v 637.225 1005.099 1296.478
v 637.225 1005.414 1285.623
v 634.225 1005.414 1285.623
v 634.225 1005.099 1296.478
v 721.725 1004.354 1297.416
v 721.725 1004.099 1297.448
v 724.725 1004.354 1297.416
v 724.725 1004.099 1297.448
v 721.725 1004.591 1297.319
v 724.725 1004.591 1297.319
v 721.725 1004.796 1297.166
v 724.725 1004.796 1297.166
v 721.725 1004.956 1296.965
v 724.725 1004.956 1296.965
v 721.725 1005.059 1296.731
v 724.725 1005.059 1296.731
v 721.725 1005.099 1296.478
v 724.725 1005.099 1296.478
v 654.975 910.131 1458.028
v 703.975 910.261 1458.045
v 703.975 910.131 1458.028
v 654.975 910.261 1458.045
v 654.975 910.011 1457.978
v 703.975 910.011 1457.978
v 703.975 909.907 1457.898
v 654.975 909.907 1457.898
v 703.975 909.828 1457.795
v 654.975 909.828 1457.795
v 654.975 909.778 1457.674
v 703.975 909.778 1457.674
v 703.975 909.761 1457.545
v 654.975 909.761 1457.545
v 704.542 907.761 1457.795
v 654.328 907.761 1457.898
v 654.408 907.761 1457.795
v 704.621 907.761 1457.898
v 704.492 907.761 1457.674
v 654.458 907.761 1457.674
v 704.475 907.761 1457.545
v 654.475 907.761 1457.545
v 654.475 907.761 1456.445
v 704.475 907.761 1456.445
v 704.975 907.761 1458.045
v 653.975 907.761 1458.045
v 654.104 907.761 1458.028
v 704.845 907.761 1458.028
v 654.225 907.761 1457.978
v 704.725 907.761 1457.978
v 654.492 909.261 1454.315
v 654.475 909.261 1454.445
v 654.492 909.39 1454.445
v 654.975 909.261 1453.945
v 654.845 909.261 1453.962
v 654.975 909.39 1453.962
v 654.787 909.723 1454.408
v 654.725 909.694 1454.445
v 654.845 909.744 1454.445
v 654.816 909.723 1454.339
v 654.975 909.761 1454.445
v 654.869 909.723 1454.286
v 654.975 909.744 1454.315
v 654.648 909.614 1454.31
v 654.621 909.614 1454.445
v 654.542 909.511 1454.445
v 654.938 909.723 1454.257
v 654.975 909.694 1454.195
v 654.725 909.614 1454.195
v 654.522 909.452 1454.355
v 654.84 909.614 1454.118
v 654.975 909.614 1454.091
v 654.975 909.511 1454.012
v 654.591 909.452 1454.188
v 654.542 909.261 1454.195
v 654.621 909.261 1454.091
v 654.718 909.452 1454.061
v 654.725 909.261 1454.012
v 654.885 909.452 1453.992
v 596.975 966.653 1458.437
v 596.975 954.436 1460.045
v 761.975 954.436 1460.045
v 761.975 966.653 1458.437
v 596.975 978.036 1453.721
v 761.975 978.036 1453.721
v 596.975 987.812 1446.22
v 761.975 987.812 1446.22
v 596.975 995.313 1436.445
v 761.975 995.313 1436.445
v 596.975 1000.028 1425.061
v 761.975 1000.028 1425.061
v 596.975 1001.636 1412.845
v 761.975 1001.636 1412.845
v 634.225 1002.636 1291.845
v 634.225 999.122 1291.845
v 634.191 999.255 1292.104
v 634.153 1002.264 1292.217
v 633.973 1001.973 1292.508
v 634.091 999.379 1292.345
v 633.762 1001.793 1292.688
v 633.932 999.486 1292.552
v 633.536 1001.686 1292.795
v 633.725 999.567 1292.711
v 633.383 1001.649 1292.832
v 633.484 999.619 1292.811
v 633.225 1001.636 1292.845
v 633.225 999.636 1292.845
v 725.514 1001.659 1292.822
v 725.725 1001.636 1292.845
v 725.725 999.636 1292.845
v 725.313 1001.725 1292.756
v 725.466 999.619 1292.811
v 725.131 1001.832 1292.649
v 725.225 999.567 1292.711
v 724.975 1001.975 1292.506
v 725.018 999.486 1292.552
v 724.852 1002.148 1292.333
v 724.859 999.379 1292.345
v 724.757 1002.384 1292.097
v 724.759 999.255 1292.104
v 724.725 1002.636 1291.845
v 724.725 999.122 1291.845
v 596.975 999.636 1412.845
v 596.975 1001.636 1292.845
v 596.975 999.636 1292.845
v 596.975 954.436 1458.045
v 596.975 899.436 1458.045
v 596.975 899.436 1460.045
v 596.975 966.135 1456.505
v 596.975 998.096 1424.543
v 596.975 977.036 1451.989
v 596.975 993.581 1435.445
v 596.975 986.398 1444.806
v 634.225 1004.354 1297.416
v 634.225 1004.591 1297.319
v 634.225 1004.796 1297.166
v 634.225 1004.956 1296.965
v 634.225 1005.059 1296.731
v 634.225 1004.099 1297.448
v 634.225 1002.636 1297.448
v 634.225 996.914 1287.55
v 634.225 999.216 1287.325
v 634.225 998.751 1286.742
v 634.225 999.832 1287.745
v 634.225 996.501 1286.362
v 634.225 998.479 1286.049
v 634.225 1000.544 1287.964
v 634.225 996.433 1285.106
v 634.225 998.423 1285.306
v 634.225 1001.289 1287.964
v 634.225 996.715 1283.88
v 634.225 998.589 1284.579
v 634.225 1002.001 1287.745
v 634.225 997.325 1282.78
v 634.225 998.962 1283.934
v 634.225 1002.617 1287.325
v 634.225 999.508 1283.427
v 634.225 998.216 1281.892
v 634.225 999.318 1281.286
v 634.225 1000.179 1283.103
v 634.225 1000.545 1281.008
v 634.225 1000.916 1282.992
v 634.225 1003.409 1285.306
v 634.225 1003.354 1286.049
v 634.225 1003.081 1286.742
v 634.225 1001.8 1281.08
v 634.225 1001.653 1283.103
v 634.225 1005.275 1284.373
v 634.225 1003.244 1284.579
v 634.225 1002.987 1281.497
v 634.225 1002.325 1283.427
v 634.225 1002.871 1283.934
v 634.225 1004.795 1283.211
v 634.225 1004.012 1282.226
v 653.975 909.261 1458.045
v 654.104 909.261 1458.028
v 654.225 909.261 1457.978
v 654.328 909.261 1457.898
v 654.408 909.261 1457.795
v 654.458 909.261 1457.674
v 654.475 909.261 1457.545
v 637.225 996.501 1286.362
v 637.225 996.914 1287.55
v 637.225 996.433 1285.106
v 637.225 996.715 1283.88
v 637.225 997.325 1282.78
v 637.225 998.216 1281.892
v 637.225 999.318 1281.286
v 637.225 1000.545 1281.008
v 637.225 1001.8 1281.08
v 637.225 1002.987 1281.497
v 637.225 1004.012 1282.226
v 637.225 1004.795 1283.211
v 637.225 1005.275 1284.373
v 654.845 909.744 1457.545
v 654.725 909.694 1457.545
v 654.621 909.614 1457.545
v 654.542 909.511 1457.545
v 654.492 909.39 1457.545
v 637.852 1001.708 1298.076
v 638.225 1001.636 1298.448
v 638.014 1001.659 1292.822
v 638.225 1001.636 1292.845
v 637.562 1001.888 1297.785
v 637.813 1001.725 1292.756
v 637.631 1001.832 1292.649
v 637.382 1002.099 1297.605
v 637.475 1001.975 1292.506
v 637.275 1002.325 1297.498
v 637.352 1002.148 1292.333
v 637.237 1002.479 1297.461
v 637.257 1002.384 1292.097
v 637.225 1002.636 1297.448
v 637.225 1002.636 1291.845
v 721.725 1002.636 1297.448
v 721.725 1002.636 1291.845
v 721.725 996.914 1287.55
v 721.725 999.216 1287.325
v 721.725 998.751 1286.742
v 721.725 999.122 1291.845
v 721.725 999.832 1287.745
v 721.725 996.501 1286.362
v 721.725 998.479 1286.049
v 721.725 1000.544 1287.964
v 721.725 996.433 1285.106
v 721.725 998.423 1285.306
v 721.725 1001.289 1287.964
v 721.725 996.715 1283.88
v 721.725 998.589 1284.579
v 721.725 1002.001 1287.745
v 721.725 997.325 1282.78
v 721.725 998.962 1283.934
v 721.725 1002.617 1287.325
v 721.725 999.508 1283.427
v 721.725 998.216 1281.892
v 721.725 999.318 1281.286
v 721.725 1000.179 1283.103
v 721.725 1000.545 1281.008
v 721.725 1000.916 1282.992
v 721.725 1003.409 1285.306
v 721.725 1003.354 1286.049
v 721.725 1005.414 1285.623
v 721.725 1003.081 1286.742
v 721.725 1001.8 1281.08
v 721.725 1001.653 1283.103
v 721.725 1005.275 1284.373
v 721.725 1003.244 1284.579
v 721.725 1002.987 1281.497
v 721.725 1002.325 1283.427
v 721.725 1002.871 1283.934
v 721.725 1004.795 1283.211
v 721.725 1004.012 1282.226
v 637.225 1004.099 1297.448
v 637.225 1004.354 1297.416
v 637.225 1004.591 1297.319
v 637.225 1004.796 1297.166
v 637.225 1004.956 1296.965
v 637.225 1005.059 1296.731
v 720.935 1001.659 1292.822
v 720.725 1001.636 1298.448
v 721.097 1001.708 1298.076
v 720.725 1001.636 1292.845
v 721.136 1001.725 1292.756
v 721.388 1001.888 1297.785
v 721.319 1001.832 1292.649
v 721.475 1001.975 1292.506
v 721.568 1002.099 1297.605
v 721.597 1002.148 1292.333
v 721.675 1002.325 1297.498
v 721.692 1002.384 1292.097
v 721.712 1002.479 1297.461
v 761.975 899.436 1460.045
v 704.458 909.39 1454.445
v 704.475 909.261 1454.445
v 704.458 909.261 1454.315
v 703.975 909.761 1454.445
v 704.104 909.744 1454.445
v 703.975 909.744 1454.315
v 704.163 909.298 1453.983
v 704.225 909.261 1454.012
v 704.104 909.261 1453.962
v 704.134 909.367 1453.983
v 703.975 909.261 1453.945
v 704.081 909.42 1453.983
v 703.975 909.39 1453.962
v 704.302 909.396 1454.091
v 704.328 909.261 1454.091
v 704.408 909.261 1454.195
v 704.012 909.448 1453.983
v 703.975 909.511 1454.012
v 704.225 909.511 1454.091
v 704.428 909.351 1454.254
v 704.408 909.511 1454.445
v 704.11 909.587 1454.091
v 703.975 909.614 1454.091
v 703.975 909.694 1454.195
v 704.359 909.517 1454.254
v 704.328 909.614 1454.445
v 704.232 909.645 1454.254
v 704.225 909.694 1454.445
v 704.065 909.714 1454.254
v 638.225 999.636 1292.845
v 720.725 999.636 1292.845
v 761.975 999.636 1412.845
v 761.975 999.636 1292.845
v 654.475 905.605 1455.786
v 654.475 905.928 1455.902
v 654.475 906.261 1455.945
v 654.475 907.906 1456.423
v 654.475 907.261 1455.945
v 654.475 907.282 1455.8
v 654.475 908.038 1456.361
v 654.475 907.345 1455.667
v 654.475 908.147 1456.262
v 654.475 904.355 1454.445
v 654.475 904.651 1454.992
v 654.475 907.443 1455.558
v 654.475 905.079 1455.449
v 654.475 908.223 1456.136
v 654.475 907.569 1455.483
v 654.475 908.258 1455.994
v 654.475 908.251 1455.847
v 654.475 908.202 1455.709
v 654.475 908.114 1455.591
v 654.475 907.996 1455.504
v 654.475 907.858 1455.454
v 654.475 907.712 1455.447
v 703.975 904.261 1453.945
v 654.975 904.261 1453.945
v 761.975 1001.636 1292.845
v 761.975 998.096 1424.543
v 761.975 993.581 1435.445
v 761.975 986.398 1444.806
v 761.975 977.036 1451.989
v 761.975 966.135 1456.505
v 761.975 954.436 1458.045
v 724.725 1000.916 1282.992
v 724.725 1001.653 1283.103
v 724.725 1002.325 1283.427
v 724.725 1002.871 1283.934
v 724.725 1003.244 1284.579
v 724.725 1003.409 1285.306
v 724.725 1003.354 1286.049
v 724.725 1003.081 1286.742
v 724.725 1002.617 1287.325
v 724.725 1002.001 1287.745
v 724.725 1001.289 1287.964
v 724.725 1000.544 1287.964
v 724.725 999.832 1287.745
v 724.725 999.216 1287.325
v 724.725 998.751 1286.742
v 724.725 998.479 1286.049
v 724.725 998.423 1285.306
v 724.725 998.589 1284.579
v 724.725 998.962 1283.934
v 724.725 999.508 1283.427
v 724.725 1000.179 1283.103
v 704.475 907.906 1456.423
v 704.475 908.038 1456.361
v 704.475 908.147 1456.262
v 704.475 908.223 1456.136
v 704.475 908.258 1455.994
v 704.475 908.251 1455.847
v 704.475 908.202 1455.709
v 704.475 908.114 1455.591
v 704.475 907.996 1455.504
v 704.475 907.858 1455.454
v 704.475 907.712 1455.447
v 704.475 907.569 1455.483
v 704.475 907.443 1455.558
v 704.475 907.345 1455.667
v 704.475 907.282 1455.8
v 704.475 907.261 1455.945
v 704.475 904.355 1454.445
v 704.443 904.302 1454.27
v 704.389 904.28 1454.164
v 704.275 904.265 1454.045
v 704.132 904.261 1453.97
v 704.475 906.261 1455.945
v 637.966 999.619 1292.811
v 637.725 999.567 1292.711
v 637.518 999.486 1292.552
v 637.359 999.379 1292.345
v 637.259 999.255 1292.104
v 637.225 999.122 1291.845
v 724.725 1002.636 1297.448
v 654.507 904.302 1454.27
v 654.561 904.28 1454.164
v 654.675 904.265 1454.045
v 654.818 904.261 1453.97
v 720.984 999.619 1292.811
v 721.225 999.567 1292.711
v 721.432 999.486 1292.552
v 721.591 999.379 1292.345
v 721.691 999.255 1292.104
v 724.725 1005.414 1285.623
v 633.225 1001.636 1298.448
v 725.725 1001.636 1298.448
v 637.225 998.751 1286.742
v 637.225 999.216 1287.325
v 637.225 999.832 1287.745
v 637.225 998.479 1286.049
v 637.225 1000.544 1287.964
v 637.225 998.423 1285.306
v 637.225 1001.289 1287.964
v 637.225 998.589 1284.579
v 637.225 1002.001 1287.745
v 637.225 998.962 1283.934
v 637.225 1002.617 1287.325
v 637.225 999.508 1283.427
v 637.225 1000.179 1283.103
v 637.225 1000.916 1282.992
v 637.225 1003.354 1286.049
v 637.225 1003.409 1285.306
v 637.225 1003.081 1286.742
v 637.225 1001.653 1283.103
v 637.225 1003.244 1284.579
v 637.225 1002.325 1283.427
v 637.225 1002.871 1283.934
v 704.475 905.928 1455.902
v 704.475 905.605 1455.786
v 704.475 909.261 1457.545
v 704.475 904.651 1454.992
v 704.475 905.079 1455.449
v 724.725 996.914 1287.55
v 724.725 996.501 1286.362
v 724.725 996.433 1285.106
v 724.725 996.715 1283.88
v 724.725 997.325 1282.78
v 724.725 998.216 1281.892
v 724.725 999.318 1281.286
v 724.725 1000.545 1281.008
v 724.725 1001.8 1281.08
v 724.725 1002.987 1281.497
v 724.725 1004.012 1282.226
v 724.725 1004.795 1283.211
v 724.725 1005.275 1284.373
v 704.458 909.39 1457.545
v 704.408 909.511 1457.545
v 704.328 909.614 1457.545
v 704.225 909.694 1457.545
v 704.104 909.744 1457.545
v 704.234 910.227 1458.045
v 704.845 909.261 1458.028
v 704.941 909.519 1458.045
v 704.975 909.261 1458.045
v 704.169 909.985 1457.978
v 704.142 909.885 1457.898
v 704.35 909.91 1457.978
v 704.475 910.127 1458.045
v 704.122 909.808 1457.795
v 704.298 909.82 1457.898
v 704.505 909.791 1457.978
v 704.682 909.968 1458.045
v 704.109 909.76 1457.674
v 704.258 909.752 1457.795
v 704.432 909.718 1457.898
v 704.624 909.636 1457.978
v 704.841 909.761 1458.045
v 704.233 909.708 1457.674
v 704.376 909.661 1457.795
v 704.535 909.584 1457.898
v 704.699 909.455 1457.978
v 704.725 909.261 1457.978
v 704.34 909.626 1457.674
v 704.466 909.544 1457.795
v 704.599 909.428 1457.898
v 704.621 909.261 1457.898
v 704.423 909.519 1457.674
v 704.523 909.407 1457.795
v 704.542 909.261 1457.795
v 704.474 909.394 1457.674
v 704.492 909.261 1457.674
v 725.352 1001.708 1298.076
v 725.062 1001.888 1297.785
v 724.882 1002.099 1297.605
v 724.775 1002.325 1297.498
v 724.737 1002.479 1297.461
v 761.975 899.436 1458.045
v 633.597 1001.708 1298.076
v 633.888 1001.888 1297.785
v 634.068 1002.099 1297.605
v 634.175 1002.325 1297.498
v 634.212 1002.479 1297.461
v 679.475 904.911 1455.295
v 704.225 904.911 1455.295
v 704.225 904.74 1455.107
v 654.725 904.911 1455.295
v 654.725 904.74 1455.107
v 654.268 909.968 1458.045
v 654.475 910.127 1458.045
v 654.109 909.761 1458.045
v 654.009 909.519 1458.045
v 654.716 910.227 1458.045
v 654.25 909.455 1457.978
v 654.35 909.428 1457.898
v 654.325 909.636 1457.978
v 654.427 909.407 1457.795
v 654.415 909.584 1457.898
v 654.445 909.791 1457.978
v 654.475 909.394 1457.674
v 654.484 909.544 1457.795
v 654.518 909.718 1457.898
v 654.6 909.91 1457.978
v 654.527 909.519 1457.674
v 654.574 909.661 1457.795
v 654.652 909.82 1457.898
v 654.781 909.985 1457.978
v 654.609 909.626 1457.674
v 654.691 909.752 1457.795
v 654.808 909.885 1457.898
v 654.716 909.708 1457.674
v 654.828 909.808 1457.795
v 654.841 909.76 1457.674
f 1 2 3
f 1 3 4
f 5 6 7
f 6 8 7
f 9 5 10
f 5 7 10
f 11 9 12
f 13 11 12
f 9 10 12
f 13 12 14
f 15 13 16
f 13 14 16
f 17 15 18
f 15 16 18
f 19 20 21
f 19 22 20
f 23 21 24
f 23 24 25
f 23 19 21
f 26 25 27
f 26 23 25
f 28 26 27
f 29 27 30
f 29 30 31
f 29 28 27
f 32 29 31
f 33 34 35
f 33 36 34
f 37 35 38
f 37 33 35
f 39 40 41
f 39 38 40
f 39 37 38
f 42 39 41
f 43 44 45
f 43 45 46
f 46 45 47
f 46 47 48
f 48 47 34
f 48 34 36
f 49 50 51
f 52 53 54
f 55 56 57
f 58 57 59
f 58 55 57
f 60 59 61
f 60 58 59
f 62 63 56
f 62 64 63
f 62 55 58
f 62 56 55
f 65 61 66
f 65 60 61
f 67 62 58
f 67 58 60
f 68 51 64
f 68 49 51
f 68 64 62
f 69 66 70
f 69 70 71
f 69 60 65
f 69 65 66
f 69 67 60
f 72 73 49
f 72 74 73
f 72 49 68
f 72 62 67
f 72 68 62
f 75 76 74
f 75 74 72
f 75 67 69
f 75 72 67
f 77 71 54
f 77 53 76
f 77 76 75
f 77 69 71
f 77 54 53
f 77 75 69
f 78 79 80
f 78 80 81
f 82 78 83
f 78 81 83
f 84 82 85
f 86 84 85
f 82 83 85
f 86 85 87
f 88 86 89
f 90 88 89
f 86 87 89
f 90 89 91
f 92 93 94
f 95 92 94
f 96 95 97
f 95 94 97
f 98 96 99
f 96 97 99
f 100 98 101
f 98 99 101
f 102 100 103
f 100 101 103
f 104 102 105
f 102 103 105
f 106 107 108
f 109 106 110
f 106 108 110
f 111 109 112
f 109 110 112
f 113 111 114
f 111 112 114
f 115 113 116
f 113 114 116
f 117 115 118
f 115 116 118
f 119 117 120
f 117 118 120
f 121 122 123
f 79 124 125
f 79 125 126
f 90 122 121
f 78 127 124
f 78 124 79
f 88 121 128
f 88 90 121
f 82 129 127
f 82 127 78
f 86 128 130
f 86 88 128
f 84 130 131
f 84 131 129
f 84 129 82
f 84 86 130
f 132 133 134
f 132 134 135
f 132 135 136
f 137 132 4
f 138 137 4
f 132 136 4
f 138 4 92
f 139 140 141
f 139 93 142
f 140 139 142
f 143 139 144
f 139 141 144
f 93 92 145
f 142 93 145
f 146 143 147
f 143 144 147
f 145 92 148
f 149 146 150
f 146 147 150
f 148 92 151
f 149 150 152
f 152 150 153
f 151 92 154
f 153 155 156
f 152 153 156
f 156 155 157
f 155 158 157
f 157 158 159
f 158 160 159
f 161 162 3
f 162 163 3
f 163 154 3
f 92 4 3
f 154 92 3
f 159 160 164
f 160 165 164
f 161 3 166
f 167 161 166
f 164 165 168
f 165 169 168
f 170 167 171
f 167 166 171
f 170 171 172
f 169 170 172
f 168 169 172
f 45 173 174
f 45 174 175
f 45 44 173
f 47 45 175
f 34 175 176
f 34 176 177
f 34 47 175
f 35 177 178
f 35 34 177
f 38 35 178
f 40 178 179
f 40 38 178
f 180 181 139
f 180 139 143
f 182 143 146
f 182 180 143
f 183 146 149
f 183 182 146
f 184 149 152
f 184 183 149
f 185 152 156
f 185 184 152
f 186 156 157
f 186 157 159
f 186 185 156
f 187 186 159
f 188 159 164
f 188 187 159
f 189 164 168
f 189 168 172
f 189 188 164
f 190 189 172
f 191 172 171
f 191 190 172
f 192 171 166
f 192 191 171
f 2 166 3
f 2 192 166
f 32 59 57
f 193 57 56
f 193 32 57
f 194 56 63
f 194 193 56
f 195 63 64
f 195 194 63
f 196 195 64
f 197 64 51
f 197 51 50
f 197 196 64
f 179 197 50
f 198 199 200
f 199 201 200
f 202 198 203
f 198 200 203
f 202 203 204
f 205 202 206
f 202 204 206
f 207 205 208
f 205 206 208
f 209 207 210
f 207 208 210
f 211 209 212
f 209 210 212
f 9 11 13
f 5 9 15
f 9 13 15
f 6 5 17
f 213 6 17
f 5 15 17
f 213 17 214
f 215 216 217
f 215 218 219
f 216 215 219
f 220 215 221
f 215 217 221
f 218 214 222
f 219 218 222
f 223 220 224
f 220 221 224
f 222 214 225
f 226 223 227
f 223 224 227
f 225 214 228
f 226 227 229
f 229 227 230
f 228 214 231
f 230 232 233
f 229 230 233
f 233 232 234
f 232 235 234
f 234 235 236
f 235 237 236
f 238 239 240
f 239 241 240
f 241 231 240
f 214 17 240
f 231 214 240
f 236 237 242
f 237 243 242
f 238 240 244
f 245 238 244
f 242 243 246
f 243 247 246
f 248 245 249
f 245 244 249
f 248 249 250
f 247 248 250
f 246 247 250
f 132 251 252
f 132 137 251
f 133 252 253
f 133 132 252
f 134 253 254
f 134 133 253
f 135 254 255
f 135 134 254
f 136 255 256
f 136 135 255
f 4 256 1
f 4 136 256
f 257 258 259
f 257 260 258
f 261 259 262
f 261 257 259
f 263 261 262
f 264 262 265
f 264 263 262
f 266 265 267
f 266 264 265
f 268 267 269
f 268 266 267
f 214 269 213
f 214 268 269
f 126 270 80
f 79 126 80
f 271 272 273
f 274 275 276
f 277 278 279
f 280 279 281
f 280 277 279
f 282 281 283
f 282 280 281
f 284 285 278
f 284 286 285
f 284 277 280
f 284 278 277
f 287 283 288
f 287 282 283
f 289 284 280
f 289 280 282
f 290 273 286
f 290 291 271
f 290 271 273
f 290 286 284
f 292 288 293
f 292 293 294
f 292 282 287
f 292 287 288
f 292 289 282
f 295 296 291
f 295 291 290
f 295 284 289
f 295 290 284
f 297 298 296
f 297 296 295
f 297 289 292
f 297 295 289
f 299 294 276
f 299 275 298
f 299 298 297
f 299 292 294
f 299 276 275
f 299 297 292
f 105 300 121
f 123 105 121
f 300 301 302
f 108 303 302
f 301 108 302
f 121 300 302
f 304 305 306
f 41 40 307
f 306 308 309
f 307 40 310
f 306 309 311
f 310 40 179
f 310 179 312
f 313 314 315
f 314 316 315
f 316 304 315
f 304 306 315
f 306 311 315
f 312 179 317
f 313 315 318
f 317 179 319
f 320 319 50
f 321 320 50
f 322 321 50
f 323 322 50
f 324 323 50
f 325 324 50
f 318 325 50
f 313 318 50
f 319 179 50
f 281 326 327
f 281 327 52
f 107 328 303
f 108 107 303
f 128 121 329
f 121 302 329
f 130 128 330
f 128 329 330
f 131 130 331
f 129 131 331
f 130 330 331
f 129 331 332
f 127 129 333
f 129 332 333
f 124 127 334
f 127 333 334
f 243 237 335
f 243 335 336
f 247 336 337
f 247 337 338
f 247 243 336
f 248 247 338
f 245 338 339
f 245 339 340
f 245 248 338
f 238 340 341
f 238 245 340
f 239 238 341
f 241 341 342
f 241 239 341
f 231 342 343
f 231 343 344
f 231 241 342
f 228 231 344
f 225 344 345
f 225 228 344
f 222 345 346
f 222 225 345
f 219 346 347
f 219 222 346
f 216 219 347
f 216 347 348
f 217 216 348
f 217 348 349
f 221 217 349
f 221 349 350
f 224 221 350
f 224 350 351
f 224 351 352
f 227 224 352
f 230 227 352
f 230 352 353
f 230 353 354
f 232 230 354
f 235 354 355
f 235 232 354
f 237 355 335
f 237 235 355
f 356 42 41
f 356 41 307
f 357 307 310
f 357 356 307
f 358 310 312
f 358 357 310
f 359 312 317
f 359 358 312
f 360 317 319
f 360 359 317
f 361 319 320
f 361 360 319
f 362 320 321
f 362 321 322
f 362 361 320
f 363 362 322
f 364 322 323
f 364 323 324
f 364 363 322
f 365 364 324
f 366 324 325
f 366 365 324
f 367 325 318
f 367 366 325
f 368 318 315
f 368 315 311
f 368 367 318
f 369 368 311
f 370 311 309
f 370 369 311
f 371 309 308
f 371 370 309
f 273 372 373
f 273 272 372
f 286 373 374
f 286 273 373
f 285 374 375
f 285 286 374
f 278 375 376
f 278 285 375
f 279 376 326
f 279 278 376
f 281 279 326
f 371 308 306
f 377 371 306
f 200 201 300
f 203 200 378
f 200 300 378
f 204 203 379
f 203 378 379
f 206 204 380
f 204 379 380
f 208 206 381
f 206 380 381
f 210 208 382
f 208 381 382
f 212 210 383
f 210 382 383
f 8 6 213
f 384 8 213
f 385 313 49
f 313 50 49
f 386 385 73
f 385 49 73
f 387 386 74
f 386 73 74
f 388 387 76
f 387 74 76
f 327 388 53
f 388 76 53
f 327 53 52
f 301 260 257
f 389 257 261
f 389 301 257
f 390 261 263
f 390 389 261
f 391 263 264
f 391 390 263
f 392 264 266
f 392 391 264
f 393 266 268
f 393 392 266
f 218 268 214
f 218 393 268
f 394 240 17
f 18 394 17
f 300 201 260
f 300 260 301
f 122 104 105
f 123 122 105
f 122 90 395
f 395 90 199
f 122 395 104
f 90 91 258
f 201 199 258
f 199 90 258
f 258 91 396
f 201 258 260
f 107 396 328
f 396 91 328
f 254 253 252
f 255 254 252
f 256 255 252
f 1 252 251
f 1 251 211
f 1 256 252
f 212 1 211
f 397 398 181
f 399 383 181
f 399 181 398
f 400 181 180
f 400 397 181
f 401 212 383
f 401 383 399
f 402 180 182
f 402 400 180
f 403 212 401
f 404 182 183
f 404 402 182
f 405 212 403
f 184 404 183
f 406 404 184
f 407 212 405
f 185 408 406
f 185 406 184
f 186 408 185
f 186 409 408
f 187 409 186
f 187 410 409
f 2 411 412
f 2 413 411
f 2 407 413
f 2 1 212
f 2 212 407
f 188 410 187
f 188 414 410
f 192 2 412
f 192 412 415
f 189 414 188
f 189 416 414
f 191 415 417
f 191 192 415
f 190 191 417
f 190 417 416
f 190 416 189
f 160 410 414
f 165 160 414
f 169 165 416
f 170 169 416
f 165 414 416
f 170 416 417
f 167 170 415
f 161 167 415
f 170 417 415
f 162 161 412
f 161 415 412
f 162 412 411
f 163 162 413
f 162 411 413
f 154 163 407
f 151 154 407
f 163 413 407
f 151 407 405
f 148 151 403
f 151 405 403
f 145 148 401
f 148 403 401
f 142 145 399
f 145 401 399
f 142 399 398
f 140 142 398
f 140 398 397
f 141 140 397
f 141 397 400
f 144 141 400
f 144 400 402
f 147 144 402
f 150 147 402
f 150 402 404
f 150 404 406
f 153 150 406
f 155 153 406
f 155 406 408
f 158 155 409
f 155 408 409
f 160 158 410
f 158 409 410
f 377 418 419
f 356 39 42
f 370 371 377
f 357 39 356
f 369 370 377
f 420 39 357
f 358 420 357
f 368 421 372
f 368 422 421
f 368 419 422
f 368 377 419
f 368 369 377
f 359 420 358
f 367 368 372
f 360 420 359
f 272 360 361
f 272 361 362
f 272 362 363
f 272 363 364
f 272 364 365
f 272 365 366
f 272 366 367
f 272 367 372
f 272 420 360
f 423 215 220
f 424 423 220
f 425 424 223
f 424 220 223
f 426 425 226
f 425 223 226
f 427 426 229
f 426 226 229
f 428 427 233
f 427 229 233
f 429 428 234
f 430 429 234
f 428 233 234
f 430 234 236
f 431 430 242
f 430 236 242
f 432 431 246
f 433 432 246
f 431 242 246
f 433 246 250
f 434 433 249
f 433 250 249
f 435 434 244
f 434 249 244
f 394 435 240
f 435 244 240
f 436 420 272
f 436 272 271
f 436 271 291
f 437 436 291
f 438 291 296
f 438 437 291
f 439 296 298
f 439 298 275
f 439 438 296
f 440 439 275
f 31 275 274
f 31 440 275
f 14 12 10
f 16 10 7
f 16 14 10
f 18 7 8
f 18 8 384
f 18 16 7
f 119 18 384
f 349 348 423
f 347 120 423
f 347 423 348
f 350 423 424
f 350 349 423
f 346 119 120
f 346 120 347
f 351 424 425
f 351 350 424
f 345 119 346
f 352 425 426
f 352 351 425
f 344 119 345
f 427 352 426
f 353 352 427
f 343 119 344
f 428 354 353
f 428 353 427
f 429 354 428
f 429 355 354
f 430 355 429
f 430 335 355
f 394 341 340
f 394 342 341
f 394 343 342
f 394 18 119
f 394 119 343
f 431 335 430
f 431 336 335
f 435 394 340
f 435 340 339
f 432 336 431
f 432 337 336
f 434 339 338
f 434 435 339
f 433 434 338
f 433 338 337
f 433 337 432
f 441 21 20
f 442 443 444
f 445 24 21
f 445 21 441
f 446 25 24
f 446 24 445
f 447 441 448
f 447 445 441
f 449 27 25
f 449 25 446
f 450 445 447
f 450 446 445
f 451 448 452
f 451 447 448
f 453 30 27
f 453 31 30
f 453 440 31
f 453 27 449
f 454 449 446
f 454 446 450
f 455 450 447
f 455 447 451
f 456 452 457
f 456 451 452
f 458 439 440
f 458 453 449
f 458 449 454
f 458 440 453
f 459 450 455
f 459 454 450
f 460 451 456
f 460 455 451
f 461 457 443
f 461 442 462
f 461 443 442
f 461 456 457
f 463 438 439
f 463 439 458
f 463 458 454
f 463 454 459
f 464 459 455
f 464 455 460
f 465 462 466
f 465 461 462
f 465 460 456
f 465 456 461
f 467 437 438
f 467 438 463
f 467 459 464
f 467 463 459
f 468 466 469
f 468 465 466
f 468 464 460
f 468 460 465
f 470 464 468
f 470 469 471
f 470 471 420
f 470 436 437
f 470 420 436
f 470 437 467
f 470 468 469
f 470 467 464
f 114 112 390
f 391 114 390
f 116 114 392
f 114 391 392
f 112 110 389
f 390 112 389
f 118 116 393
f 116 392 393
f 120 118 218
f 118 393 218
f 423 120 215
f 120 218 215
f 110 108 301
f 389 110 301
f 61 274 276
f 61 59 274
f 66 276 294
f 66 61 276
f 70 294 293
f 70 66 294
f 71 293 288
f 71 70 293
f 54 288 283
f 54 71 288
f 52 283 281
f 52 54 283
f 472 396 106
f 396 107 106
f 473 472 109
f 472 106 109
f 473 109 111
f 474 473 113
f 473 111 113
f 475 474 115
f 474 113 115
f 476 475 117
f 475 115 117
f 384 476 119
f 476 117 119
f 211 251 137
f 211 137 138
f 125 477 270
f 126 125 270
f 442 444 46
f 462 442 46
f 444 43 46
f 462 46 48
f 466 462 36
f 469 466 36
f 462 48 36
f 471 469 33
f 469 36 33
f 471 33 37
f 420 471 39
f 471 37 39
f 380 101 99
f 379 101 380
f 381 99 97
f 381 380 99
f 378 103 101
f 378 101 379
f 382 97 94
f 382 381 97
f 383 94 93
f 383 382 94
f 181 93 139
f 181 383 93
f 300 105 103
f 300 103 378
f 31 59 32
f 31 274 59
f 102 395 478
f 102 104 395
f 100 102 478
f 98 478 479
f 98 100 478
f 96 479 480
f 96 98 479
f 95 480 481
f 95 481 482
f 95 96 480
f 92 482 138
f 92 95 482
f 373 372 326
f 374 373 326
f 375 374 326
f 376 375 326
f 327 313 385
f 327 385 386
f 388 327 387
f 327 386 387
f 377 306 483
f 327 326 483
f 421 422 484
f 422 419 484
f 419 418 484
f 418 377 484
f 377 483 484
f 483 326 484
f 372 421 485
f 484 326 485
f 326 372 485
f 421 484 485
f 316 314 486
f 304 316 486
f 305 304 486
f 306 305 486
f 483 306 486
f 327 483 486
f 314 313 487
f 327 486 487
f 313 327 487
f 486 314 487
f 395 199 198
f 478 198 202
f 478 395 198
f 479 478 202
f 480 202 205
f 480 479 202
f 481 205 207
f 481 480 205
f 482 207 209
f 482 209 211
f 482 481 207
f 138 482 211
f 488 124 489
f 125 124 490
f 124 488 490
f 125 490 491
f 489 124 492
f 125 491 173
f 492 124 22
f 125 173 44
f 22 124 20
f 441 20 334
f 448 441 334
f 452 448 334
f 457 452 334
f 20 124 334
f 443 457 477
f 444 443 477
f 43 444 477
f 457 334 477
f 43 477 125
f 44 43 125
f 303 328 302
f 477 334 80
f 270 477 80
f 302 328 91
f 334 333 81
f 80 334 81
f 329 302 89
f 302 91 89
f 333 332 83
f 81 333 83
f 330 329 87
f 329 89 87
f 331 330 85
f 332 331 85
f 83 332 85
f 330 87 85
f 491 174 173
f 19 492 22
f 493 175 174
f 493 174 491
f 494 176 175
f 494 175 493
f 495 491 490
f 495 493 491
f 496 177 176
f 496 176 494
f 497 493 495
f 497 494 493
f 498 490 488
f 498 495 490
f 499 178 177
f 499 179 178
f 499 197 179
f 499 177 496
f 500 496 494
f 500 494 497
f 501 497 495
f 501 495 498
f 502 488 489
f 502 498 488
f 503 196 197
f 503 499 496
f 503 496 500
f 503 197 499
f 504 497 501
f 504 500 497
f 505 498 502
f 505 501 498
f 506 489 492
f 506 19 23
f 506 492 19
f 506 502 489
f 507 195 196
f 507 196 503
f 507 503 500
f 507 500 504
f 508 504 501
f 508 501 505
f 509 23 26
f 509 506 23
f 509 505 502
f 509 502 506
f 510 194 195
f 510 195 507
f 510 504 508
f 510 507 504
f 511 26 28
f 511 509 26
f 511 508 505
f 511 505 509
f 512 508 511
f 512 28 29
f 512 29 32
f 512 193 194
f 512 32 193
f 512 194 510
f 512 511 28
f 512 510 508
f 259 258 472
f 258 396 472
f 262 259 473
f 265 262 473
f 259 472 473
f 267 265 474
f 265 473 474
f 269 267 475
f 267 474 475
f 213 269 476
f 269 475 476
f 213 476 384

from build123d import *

# Parameters (mm, degrees)
BOSS_EXTRUDE1_DEPTH  = 82.5
SKETCH2_R            = 2.5
BOSS_EXTRUDE2_DEPTH  = 3
FILLET1_R            = 1
FILLET1_OF_MIRROR1_R = 1
BOSS_EXTRUDE3_DEPTH  = 25
FILLET2_SIZE         = 2
FILLET3_R            = 0.5


with BuildPart() as part:
    # Sketch1 → Boss-Extrude1 (new, symmetric)
    with BuildSketch(Plane(origin=(679.474882377, 899.436301878, 1292.844863494), x_dir=(0, 0, -1), z_dir=(1, 0, 0))):
        with BuildLine():
            Line((-167.2, 0), (-167.2, 55))
            ThreePointArc((-167.2, 55), (-153.375440072, 88.375440072), (-120, 102.2))
            Line((-120, 102.2), (0, 102.2))
            Line((0, 102.2), (0, 100.2))
            Line((0, 100.2), (-120, 100.2))
            ThreePointArc((-120, 100.2), (-151.96122651, 86.96122651), (-165.2, 55))
            Line((-165.2, 55), (-165.2, 0))
            Line((-165.2, 0), (-167.2, 0))
        make_face()
    extrude(amount=BOSS_EXTRUDE1_DEPTH, both=True)

    # Sketch2 → Boss-Extrude2 (add)
    with BuildSketch(Plane(origin=(721.724882377, 0, 0), x_dir=(0, 0, -1), z_dir=(1, 0, 0))):
        with BuildLine():
            Line((-1292.844863494, 999.636301878), (-1287.549744281, 996.914228228))
            ThreePointArc((-1287.549744281, 996.914228228), (-1281.103673423, 999.921643269), (-1285.623100176, 1005.414471007))
            Line((-1285.623100176, 1005.414471007), (-1297.448447634, 1005.070743882))
            Line((-1297.448447634, 1005.070743882), (-1297.448447634, 1001.636301878))
            Line((-1297.448447634, 1001.636301878), (-1292.844863494, 1001.636301878))
            Line((-1292.844863494, 1001.636301878), (-1292.844863494, 999.636301878))
        make_face()
        with Locations((-1285.492353992, 1000.916370804)):
            Circle(SKETCH2_R, mode=Mode.SUBTRACT)
    boss_extrude2 = extrude(amount=BOSS_EXTRUDE2_DEPTH)

    # Fillet1
    fillet1_edges = [part.edges().sort_by_distance(p)[0] for p in [
        (724.724882377, 1000.636301878, 1292.844863494),
        (724.724882377, 1001.636301878, 1295.146655564),
        (721.724882377, 1000.636301878, 1292.844863494),
        (723.224882377, 1005.070743882, 1297.448447634),
        (721.724882377, 1001.636301878, 1295.146655564),
        (723.224882377, 1001.636301878, 1297.448447634),
    ]]
    fillet(fillet1_edges, radius=FILLET1_R)

    # Mirror1: Boss-Extrude2 across plane
    add(boss_extrude2.mirror(Plane(origin=(679.474882377, 0, 0), x_dir=(0, 0, 1), z_dir=(1, 0, 0))))

    # Fillet1 of Mirror1
    fillet1_of_mirror1_edges = [part.edges().sort_by_distance(p)[0] for p in [
        (634.224882377, 1000.636301878, 1292.844863494),
        (634.224882377, 1001.636301878, 1295.146655564),
        (637.224882377, 1000.636301878, 1292.844863494),
        (635.724882377, 1005.070743882, 1297.448447634),
        (637.224882377, 1001.636301878, 1295.146655564),
        (635.724882377, 1001.636301878, 1297.448447634),
    ]]
    fillet(fillet1_of_mirror1_edges, radius=FILLET1_OF_MIRROR1_R)

    # Sketch3 → Boss-Extrude3 (add, symmetric)
    with BuildSketch(Plane(origin=(679.474882377, 0, 0), x_dir=(0, 0, -1), z_dir=(1, 0, 0))):
        with BuildLine():
            Line((-1458.044863494, 907.760575274), (-1456.444863494, 907.760575274))
            ThreePointArc((-1456.444863494, 907.760575274), (-1455.591310103, 908.114128665), (-1455.944863494, 907.260575274))
            Line((-1455.944863494, 907.260575274), (-1455.944863494, 904.260575274))
            Line((-1455.944863494, 904.260575274), (-1453.944863494, 904.260575274))
            Line((-1453.944863494, 904.260575274), (-1453.944863494, 909.760575274))
            Line((-1453.944863494, 909.760575274), (-1458.044863494, 909.760575274))
            Line((-1458.044863494, 909.760575274), (-1458.044863494, 907.760575274))
        make_face()
    extrude(amount=BOSS_EXTRUDE3_DEPTH, both=True)

    # Fillet2
    # a fillet whose section is not a circle: 2 mm, written as the material it takes off along each edge
    with BuildSketch(Plane(origin=(649.474882377, 904.260575274, 1455.944863494), x_dir=(0, 1, 0), z_dir=(1, 0, 0))) as fillet2_piece_1:
        with BuildLine():
            Bezier((FILLET2_SIZE, 0), (0, 0), (0, -FILLET2_SIZE), weights=[1, 0.538461538, 1])
            Line((0, -FILLET2_SIZE), (0, 0))
            Line((0, 0), (FILLET2_SIZE, 0))
        make_face()
    extrude(amount=60, mode=Mode.SUBTRACT)

    # Fillet3
    fillet3_edges = [part.edges().sort_by_distance(p)[0] for p in [
        (654.474882377, 907.010575274, 1453.944863494),
        (654.474882377, 909.760575274, 1455.994863494),
        (654.474882377, 908.760575274, 1458.044863494),
        (704.474882377, 908.760575274, 1458.044863494),
        (704.474882377, 909.760575274, 1455.994863494),
        (704.474882377, 907.010575274, 1453.944863494),
        (679.474882377, 909.760575274, 1458.044863494),
        (679.474882377, 909.760575274, 1453.944863494),
    ]]
    fillet(fillet3_edges, radius=FILLET3_R)


solid = part.part
